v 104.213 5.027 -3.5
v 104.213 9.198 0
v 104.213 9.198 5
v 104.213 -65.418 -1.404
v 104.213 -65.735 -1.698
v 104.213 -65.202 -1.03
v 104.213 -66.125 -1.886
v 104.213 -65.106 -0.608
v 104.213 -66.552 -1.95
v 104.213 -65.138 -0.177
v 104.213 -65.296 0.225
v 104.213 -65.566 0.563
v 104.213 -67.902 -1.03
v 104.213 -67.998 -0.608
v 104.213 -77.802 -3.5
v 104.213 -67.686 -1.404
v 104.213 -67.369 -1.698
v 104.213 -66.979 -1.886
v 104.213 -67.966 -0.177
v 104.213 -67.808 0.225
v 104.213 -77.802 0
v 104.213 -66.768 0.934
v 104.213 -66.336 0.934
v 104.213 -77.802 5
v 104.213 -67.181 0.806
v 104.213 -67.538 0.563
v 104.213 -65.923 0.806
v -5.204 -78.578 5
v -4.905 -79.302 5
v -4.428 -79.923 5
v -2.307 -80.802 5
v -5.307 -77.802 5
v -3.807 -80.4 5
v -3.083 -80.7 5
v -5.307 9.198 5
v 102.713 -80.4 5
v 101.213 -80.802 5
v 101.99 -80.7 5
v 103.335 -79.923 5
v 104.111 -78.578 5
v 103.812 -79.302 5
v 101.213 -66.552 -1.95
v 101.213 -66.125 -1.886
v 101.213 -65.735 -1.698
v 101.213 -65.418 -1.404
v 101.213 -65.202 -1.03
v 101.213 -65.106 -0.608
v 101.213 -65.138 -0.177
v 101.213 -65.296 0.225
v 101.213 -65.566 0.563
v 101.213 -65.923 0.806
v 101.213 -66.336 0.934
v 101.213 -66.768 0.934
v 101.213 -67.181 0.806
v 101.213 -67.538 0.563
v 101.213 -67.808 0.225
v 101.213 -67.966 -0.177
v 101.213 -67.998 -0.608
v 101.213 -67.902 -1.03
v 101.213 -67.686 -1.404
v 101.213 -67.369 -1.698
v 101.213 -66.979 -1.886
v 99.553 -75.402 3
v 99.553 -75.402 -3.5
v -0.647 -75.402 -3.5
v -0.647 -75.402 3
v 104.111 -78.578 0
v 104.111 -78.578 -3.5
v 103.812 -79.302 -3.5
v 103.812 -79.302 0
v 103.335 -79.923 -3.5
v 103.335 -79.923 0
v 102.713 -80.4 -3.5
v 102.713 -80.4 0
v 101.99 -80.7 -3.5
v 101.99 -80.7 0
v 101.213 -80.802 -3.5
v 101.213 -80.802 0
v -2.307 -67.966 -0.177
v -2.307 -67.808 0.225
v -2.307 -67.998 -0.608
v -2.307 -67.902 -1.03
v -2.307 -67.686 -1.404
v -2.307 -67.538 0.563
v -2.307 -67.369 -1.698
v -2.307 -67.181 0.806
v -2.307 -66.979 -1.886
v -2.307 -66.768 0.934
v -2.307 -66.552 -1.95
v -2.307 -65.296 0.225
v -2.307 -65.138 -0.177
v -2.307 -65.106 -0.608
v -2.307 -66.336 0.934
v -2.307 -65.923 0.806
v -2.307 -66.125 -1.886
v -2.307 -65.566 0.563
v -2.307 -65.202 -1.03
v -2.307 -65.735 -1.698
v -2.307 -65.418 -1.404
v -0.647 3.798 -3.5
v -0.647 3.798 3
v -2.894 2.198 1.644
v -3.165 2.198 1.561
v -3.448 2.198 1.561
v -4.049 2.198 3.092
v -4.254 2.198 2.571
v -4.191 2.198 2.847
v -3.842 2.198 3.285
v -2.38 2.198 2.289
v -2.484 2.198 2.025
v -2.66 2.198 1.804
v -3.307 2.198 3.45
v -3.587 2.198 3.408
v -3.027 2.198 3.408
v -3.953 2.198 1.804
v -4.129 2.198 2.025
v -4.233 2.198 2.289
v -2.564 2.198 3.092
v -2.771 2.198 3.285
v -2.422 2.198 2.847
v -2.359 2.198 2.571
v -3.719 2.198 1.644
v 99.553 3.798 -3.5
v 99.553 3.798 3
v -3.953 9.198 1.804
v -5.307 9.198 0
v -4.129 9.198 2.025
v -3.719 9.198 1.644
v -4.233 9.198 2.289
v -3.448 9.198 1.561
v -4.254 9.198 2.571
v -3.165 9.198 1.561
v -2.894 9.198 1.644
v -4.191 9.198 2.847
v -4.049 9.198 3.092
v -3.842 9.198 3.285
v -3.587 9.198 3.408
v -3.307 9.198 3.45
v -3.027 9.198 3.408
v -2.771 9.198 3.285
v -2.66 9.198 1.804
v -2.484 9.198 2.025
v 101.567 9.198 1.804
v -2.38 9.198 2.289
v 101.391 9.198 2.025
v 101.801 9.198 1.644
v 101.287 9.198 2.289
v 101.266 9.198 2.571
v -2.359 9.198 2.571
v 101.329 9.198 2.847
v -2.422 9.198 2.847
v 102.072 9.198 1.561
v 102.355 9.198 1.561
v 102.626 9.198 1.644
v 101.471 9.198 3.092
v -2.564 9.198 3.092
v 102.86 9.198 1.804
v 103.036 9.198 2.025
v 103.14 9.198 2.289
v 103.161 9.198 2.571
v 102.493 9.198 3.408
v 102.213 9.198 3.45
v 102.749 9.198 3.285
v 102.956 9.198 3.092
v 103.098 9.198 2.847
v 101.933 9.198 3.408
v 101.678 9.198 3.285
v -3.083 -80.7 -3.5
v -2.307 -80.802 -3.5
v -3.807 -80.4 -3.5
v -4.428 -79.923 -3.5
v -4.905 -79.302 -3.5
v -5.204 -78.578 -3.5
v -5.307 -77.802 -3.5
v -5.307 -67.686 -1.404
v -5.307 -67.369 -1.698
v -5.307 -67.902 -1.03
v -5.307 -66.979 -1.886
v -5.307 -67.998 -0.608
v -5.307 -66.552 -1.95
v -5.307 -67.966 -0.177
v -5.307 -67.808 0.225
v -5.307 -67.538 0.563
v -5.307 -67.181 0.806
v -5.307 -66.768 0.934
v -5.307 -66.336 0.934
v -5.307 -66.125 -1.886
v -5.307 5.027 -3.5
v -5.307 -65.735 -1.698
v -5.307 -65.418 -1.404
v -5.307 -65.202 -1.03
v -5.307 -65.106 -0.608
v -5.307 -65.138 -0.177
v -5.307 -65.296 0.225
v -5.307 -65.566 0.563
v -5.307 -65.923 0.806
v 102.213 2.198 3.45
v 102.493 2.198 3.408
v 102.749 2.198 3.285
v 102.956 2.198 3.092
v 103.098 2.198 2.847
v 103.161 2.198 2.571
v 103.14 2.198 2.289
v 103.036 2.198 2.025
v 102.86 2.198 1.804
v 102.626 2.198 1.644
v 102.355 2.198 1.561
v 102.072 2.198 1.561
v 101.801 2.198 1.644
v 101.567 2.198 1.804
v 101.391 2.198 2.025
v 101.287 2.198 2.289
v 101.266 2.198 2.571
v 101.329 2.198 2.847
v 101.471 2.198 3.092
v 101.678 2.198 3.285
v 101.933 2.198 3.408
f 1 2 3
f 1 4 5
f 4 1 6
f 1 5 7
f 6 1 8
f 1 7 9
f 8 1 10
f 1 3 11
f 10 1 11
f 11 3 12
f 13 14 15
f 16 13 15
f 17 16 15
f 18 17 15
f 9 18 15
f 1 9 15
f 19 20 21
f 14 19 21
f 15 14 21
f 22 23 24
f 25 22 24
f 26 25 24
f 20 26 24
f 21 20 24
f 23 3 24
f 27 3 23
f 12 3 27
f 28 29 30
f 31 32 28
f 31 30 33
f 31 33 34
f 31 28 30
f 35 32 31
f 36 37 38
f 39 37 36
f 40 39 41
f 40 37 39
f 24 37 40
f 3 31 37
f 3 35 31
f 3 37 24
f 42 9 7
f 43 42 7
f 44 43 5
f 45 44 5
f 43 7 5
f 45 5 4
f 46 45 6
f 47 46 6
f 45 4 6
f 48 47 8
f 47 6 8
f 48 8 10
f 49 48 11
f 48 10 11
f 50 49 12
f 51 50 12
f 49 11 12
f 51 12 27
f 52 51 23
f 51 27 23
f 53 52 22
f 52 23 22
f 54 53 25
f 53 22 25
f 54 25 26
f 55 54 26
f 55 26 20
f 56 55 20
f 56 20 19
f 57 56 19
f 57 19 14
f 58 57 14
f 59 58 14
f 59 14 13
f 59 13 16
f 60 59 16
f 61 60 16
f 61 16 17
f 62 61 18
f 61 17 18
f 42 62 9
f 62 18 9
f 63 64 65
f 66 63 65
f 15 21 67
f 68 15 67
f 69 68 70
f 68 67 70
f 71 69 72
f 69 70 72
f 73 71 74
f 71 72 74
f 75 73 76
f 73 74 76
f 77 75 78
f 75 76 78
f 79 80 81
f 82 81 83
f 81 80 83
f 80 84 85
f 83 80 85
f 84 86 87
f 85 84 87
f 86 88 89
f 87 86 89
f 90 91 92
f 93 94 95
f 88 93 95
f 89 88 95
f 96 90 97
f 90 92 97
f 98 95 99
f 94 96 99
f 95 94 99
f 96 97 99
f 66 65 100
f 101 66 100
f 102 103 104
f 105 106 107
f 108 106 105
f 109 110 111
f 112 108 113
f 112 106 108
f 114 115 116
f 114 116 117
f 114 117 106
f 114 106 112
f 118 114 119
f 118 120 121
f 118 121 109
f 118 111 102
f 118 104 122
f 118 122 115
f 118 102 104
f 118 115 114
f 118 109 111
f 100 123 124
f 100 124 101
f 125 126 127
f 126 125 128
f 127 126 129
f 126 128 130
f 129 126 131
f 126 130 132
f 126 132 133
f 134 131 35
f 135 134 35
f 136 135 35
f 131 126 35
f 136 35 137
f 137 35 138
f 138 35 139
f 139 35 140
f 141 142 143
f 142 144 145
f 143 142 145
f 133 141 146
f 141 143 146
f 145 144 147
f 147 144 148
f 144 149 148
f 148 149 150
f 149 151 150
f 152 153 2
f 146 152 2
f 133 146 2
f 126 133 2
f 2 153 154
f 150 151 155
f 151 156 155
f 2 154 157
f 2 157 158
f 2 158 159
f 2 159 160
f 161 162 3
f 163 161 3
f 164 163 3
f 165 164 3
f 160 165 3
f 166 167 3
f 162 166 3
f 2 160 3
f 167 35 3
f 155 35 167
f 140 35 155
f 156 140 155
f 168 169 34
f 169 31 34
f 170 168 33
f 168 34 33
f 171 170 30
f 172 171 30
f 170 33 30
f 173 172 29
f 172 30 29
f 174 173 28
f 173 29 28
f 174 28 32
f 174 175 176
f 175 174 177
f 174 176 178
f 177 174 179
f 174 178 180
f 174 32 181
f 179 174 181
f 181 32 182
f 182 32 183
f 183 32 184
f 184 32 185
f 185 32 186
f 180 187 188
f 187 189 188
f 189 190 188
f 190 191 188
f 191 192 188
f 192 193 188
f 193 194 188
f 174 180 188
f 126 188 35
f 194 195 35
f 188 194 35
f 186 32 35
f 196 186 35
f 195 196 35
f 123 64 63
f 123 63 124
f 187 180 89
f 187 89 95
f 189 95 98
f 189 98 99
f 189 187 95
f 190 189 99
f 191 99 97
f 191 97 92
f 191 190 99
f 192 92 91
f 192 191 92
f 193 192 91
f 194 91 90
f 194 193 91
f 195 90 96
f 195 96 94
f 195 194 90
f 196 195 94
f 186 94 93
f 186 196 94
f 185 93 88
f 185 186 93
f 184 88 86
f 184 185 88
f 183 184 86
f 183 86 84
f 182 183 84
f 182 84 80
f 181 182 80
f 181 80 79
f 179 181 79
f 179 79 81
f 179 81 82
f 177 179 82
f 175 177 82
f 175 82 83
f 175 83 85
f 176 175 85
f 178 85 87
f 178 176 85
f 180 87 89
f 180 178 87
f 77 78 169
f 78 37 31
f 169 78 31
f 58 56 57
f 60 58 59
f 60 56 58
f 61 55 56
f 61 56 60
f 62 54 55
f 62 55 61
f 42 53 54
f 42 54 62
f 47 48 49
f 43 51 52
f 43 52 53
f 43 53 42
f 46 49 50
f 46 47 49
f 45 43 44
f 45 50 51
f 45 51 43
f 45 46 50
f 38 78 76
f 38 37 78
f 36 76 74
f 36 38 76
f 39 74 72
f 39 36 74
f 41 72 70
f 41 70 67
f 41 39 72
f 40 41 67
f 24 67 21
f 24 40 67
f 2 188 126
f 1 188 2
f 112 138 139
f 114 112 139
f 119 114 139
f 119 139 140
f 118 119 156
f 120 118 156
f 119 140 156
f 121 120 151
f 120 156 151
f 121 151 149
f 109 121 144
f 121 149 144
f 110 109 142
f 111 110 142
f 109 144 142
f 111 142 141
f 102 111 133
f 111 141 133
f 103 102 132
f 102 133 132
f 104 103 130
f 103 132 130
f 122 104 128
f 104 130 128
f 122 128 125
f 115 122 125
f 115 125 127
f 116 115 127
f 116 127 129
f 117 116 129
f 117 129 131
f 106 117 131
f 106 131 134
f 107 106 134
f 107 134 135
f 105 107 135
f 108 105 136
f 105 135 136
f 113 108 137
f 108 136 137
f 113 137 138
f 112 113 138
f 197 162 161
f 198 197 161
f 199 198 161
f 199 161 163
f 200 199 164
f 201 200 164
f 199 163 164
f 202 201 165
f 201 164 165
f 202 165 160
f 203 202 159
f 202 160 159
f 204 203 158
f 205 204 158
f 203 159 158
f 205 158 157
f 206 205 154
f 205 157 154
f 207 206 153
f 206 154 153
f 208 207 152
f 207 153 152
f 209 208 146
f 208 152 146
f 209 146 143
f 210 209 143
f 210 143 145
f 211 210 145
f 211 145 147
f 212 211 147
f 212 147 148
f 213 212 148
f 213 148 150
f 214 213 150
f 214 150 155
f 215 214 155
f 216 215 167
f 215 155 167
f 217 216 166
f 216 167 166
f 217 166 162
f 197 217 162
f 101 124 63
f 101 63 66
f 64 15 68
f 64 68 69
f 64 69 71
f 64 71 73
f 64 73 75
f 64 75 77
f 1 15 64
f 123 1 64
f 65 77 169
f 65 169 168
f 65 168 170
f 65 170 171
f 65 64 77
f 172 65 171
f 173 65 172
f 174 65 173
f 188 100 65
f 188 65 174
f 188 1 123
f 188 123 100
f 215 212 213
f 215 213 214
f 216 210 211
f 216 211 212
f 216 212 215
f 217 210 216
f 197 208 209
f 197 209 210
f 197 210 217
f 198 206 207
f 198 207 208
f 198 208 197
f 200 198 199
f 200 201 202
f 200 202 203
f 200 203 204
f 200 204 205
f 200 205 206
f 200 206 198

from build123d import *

# Parameters (mm, degrees)
SKETCH1_W           = 109.52
SKETCH1_H           = 90
BOSS_EXTRUDE1_DEPTH = 5
SKETCH2_R           = 0.95
CUT_EXTRUDE1_DEPTH  = 7
FILLET1_R           = 3
BOSS_EXTRUDE2_DEPTH = 3.5
CHAMFER1_SIZE       = 3.5
CHAMFER1_SIZE2      = 4.171137574
SKETCH5_W           = 100.2
SKETCH5_H           = 79.2
CUT_EXTRUDE3_DEPTH  = 6.5
SKETCH8_R           = 1.45
CUT_EXTRUDE5_DEPTH  = 3


with BuildPart() as part:
    # Sketch1 → Boss-Extrude1 (new body)
    with BuildSketch(Plane.XY):
        with Locations((49.453432203, -35.801949153)):
            Rectangle(SKETCH1_W, SKETCH1_H)
    extrude(amount=BOSS_EXTRUDE1_DEPTH)

    # Sketch2 → Cut-Extrude1 (cut)
    with BuildSketch(Plane(origin=(0, 9.198050847, 0), x_dir=(1, 0, 0), z_dir=(0, 1, 0))):
        with Locations(Location((-3.306567797, -2.5, 0), (0, 0, 270))):
            Circle(SKETCH2_R)
        with Locations(Location((102.213432203, -2.5, 0), (0, 0, 270))):
            Circle(SKETCH2_R)
    extrude(amount=-CUT_EXTRUDE1_DEPTH, mode=Mode.SUBTRACT)

    # Fillet1
    fillet1_edges = [part.edges().sort_by_distance(p)[0] for p in [
        (104.213432203, -80.801949153, 2.5),
        (-5.306567797, -80.801949153, 2.5),
    ]]
    fillet(fillet1_edges, radius=FILLET1_R)

    # Sketch4 → Boss-Extrude2 (add)
    with BuildSketch(Plane(origin=(0, 0, 0), x_dir=(-1, 0, 0), z_dir=(0, 0, -1))):
        with BuildLine():
            Line((-104.213432203, 9.198050847), (-104.213432203, -77.801949153))
            ThreePointArc((-104.213432203, -77.801949153), (-103.334752547, -79.923269496), (-101.213432203, -80.801949153))
            Line((-101.213432203, -80.801949153), (2.306567797, -80.801949153))
            ThreePointArc((2.306567797, -80.801949153), (4.42788814, -79.923269496), (5.306567797, -77.801949153))
            Line((5.306567797, -77.801949153), (5.306567797, 9.198050847))
            Line((5.306567797, 9.198050847), (-104.213432203, 9.198050847))
        make_face()
    extrude(amount=BOSS_EXTRUDE2_DEPTH)

    # Chamfer1
    chamfer1_edges = [part.edges().sort_by_distance(p)[0] for p in [
        (49.453432203, 9.198050847, -3.5),
    ]]
    chamfer1_side = [part.faces().sort_by_distance(p)[0] for p in [
        (49.453432203, 9.198050847, 0.739274778),
    ]]
    chamfer(chamfer1_edges, length=CHAMFER1_SIZE, length2=CHAMFER1_SIZE2, reference=chamfer1_side[0])

    # Sketch5 → Cut-Extrude3 (cut)
    with BuildSketch(Plane(origin=(0, 0, -3.5), x_dir=(-1, 0, 0), z_dir=(0, 0, -1))):
        with Locations((-49.453432203, -35.801949153)):
            Rectangle(SKETCH5_W, SKETCH5_H)
    extrude(amount=-CUT_EXTRUDE3_DEPTH, mode=Mode.SUBTRACT)

    # Sketch8 → Cut-Extrude5 (cut)
    with BuildSketch(Plane(origin=(104.213432203, 0, 0), x_dir=(0, 0, -1), z_dir=(1, 0, 0))):
        with Locations((0.5, -66.551949153)):
            Circle(SKETCH8_R)
    cut_extrude5 = extrude(amount=-CUT_EXTRUDE5_DEPTH, mode=Mode.SUBTRACT)

    # Mirror2: Cut-Extrude5 across plane
    add(cut_extrude5.mirror(Plane.ZY.offset(-49.453432203)), mode=Mode.SUBTRACT)


solid = part.part
